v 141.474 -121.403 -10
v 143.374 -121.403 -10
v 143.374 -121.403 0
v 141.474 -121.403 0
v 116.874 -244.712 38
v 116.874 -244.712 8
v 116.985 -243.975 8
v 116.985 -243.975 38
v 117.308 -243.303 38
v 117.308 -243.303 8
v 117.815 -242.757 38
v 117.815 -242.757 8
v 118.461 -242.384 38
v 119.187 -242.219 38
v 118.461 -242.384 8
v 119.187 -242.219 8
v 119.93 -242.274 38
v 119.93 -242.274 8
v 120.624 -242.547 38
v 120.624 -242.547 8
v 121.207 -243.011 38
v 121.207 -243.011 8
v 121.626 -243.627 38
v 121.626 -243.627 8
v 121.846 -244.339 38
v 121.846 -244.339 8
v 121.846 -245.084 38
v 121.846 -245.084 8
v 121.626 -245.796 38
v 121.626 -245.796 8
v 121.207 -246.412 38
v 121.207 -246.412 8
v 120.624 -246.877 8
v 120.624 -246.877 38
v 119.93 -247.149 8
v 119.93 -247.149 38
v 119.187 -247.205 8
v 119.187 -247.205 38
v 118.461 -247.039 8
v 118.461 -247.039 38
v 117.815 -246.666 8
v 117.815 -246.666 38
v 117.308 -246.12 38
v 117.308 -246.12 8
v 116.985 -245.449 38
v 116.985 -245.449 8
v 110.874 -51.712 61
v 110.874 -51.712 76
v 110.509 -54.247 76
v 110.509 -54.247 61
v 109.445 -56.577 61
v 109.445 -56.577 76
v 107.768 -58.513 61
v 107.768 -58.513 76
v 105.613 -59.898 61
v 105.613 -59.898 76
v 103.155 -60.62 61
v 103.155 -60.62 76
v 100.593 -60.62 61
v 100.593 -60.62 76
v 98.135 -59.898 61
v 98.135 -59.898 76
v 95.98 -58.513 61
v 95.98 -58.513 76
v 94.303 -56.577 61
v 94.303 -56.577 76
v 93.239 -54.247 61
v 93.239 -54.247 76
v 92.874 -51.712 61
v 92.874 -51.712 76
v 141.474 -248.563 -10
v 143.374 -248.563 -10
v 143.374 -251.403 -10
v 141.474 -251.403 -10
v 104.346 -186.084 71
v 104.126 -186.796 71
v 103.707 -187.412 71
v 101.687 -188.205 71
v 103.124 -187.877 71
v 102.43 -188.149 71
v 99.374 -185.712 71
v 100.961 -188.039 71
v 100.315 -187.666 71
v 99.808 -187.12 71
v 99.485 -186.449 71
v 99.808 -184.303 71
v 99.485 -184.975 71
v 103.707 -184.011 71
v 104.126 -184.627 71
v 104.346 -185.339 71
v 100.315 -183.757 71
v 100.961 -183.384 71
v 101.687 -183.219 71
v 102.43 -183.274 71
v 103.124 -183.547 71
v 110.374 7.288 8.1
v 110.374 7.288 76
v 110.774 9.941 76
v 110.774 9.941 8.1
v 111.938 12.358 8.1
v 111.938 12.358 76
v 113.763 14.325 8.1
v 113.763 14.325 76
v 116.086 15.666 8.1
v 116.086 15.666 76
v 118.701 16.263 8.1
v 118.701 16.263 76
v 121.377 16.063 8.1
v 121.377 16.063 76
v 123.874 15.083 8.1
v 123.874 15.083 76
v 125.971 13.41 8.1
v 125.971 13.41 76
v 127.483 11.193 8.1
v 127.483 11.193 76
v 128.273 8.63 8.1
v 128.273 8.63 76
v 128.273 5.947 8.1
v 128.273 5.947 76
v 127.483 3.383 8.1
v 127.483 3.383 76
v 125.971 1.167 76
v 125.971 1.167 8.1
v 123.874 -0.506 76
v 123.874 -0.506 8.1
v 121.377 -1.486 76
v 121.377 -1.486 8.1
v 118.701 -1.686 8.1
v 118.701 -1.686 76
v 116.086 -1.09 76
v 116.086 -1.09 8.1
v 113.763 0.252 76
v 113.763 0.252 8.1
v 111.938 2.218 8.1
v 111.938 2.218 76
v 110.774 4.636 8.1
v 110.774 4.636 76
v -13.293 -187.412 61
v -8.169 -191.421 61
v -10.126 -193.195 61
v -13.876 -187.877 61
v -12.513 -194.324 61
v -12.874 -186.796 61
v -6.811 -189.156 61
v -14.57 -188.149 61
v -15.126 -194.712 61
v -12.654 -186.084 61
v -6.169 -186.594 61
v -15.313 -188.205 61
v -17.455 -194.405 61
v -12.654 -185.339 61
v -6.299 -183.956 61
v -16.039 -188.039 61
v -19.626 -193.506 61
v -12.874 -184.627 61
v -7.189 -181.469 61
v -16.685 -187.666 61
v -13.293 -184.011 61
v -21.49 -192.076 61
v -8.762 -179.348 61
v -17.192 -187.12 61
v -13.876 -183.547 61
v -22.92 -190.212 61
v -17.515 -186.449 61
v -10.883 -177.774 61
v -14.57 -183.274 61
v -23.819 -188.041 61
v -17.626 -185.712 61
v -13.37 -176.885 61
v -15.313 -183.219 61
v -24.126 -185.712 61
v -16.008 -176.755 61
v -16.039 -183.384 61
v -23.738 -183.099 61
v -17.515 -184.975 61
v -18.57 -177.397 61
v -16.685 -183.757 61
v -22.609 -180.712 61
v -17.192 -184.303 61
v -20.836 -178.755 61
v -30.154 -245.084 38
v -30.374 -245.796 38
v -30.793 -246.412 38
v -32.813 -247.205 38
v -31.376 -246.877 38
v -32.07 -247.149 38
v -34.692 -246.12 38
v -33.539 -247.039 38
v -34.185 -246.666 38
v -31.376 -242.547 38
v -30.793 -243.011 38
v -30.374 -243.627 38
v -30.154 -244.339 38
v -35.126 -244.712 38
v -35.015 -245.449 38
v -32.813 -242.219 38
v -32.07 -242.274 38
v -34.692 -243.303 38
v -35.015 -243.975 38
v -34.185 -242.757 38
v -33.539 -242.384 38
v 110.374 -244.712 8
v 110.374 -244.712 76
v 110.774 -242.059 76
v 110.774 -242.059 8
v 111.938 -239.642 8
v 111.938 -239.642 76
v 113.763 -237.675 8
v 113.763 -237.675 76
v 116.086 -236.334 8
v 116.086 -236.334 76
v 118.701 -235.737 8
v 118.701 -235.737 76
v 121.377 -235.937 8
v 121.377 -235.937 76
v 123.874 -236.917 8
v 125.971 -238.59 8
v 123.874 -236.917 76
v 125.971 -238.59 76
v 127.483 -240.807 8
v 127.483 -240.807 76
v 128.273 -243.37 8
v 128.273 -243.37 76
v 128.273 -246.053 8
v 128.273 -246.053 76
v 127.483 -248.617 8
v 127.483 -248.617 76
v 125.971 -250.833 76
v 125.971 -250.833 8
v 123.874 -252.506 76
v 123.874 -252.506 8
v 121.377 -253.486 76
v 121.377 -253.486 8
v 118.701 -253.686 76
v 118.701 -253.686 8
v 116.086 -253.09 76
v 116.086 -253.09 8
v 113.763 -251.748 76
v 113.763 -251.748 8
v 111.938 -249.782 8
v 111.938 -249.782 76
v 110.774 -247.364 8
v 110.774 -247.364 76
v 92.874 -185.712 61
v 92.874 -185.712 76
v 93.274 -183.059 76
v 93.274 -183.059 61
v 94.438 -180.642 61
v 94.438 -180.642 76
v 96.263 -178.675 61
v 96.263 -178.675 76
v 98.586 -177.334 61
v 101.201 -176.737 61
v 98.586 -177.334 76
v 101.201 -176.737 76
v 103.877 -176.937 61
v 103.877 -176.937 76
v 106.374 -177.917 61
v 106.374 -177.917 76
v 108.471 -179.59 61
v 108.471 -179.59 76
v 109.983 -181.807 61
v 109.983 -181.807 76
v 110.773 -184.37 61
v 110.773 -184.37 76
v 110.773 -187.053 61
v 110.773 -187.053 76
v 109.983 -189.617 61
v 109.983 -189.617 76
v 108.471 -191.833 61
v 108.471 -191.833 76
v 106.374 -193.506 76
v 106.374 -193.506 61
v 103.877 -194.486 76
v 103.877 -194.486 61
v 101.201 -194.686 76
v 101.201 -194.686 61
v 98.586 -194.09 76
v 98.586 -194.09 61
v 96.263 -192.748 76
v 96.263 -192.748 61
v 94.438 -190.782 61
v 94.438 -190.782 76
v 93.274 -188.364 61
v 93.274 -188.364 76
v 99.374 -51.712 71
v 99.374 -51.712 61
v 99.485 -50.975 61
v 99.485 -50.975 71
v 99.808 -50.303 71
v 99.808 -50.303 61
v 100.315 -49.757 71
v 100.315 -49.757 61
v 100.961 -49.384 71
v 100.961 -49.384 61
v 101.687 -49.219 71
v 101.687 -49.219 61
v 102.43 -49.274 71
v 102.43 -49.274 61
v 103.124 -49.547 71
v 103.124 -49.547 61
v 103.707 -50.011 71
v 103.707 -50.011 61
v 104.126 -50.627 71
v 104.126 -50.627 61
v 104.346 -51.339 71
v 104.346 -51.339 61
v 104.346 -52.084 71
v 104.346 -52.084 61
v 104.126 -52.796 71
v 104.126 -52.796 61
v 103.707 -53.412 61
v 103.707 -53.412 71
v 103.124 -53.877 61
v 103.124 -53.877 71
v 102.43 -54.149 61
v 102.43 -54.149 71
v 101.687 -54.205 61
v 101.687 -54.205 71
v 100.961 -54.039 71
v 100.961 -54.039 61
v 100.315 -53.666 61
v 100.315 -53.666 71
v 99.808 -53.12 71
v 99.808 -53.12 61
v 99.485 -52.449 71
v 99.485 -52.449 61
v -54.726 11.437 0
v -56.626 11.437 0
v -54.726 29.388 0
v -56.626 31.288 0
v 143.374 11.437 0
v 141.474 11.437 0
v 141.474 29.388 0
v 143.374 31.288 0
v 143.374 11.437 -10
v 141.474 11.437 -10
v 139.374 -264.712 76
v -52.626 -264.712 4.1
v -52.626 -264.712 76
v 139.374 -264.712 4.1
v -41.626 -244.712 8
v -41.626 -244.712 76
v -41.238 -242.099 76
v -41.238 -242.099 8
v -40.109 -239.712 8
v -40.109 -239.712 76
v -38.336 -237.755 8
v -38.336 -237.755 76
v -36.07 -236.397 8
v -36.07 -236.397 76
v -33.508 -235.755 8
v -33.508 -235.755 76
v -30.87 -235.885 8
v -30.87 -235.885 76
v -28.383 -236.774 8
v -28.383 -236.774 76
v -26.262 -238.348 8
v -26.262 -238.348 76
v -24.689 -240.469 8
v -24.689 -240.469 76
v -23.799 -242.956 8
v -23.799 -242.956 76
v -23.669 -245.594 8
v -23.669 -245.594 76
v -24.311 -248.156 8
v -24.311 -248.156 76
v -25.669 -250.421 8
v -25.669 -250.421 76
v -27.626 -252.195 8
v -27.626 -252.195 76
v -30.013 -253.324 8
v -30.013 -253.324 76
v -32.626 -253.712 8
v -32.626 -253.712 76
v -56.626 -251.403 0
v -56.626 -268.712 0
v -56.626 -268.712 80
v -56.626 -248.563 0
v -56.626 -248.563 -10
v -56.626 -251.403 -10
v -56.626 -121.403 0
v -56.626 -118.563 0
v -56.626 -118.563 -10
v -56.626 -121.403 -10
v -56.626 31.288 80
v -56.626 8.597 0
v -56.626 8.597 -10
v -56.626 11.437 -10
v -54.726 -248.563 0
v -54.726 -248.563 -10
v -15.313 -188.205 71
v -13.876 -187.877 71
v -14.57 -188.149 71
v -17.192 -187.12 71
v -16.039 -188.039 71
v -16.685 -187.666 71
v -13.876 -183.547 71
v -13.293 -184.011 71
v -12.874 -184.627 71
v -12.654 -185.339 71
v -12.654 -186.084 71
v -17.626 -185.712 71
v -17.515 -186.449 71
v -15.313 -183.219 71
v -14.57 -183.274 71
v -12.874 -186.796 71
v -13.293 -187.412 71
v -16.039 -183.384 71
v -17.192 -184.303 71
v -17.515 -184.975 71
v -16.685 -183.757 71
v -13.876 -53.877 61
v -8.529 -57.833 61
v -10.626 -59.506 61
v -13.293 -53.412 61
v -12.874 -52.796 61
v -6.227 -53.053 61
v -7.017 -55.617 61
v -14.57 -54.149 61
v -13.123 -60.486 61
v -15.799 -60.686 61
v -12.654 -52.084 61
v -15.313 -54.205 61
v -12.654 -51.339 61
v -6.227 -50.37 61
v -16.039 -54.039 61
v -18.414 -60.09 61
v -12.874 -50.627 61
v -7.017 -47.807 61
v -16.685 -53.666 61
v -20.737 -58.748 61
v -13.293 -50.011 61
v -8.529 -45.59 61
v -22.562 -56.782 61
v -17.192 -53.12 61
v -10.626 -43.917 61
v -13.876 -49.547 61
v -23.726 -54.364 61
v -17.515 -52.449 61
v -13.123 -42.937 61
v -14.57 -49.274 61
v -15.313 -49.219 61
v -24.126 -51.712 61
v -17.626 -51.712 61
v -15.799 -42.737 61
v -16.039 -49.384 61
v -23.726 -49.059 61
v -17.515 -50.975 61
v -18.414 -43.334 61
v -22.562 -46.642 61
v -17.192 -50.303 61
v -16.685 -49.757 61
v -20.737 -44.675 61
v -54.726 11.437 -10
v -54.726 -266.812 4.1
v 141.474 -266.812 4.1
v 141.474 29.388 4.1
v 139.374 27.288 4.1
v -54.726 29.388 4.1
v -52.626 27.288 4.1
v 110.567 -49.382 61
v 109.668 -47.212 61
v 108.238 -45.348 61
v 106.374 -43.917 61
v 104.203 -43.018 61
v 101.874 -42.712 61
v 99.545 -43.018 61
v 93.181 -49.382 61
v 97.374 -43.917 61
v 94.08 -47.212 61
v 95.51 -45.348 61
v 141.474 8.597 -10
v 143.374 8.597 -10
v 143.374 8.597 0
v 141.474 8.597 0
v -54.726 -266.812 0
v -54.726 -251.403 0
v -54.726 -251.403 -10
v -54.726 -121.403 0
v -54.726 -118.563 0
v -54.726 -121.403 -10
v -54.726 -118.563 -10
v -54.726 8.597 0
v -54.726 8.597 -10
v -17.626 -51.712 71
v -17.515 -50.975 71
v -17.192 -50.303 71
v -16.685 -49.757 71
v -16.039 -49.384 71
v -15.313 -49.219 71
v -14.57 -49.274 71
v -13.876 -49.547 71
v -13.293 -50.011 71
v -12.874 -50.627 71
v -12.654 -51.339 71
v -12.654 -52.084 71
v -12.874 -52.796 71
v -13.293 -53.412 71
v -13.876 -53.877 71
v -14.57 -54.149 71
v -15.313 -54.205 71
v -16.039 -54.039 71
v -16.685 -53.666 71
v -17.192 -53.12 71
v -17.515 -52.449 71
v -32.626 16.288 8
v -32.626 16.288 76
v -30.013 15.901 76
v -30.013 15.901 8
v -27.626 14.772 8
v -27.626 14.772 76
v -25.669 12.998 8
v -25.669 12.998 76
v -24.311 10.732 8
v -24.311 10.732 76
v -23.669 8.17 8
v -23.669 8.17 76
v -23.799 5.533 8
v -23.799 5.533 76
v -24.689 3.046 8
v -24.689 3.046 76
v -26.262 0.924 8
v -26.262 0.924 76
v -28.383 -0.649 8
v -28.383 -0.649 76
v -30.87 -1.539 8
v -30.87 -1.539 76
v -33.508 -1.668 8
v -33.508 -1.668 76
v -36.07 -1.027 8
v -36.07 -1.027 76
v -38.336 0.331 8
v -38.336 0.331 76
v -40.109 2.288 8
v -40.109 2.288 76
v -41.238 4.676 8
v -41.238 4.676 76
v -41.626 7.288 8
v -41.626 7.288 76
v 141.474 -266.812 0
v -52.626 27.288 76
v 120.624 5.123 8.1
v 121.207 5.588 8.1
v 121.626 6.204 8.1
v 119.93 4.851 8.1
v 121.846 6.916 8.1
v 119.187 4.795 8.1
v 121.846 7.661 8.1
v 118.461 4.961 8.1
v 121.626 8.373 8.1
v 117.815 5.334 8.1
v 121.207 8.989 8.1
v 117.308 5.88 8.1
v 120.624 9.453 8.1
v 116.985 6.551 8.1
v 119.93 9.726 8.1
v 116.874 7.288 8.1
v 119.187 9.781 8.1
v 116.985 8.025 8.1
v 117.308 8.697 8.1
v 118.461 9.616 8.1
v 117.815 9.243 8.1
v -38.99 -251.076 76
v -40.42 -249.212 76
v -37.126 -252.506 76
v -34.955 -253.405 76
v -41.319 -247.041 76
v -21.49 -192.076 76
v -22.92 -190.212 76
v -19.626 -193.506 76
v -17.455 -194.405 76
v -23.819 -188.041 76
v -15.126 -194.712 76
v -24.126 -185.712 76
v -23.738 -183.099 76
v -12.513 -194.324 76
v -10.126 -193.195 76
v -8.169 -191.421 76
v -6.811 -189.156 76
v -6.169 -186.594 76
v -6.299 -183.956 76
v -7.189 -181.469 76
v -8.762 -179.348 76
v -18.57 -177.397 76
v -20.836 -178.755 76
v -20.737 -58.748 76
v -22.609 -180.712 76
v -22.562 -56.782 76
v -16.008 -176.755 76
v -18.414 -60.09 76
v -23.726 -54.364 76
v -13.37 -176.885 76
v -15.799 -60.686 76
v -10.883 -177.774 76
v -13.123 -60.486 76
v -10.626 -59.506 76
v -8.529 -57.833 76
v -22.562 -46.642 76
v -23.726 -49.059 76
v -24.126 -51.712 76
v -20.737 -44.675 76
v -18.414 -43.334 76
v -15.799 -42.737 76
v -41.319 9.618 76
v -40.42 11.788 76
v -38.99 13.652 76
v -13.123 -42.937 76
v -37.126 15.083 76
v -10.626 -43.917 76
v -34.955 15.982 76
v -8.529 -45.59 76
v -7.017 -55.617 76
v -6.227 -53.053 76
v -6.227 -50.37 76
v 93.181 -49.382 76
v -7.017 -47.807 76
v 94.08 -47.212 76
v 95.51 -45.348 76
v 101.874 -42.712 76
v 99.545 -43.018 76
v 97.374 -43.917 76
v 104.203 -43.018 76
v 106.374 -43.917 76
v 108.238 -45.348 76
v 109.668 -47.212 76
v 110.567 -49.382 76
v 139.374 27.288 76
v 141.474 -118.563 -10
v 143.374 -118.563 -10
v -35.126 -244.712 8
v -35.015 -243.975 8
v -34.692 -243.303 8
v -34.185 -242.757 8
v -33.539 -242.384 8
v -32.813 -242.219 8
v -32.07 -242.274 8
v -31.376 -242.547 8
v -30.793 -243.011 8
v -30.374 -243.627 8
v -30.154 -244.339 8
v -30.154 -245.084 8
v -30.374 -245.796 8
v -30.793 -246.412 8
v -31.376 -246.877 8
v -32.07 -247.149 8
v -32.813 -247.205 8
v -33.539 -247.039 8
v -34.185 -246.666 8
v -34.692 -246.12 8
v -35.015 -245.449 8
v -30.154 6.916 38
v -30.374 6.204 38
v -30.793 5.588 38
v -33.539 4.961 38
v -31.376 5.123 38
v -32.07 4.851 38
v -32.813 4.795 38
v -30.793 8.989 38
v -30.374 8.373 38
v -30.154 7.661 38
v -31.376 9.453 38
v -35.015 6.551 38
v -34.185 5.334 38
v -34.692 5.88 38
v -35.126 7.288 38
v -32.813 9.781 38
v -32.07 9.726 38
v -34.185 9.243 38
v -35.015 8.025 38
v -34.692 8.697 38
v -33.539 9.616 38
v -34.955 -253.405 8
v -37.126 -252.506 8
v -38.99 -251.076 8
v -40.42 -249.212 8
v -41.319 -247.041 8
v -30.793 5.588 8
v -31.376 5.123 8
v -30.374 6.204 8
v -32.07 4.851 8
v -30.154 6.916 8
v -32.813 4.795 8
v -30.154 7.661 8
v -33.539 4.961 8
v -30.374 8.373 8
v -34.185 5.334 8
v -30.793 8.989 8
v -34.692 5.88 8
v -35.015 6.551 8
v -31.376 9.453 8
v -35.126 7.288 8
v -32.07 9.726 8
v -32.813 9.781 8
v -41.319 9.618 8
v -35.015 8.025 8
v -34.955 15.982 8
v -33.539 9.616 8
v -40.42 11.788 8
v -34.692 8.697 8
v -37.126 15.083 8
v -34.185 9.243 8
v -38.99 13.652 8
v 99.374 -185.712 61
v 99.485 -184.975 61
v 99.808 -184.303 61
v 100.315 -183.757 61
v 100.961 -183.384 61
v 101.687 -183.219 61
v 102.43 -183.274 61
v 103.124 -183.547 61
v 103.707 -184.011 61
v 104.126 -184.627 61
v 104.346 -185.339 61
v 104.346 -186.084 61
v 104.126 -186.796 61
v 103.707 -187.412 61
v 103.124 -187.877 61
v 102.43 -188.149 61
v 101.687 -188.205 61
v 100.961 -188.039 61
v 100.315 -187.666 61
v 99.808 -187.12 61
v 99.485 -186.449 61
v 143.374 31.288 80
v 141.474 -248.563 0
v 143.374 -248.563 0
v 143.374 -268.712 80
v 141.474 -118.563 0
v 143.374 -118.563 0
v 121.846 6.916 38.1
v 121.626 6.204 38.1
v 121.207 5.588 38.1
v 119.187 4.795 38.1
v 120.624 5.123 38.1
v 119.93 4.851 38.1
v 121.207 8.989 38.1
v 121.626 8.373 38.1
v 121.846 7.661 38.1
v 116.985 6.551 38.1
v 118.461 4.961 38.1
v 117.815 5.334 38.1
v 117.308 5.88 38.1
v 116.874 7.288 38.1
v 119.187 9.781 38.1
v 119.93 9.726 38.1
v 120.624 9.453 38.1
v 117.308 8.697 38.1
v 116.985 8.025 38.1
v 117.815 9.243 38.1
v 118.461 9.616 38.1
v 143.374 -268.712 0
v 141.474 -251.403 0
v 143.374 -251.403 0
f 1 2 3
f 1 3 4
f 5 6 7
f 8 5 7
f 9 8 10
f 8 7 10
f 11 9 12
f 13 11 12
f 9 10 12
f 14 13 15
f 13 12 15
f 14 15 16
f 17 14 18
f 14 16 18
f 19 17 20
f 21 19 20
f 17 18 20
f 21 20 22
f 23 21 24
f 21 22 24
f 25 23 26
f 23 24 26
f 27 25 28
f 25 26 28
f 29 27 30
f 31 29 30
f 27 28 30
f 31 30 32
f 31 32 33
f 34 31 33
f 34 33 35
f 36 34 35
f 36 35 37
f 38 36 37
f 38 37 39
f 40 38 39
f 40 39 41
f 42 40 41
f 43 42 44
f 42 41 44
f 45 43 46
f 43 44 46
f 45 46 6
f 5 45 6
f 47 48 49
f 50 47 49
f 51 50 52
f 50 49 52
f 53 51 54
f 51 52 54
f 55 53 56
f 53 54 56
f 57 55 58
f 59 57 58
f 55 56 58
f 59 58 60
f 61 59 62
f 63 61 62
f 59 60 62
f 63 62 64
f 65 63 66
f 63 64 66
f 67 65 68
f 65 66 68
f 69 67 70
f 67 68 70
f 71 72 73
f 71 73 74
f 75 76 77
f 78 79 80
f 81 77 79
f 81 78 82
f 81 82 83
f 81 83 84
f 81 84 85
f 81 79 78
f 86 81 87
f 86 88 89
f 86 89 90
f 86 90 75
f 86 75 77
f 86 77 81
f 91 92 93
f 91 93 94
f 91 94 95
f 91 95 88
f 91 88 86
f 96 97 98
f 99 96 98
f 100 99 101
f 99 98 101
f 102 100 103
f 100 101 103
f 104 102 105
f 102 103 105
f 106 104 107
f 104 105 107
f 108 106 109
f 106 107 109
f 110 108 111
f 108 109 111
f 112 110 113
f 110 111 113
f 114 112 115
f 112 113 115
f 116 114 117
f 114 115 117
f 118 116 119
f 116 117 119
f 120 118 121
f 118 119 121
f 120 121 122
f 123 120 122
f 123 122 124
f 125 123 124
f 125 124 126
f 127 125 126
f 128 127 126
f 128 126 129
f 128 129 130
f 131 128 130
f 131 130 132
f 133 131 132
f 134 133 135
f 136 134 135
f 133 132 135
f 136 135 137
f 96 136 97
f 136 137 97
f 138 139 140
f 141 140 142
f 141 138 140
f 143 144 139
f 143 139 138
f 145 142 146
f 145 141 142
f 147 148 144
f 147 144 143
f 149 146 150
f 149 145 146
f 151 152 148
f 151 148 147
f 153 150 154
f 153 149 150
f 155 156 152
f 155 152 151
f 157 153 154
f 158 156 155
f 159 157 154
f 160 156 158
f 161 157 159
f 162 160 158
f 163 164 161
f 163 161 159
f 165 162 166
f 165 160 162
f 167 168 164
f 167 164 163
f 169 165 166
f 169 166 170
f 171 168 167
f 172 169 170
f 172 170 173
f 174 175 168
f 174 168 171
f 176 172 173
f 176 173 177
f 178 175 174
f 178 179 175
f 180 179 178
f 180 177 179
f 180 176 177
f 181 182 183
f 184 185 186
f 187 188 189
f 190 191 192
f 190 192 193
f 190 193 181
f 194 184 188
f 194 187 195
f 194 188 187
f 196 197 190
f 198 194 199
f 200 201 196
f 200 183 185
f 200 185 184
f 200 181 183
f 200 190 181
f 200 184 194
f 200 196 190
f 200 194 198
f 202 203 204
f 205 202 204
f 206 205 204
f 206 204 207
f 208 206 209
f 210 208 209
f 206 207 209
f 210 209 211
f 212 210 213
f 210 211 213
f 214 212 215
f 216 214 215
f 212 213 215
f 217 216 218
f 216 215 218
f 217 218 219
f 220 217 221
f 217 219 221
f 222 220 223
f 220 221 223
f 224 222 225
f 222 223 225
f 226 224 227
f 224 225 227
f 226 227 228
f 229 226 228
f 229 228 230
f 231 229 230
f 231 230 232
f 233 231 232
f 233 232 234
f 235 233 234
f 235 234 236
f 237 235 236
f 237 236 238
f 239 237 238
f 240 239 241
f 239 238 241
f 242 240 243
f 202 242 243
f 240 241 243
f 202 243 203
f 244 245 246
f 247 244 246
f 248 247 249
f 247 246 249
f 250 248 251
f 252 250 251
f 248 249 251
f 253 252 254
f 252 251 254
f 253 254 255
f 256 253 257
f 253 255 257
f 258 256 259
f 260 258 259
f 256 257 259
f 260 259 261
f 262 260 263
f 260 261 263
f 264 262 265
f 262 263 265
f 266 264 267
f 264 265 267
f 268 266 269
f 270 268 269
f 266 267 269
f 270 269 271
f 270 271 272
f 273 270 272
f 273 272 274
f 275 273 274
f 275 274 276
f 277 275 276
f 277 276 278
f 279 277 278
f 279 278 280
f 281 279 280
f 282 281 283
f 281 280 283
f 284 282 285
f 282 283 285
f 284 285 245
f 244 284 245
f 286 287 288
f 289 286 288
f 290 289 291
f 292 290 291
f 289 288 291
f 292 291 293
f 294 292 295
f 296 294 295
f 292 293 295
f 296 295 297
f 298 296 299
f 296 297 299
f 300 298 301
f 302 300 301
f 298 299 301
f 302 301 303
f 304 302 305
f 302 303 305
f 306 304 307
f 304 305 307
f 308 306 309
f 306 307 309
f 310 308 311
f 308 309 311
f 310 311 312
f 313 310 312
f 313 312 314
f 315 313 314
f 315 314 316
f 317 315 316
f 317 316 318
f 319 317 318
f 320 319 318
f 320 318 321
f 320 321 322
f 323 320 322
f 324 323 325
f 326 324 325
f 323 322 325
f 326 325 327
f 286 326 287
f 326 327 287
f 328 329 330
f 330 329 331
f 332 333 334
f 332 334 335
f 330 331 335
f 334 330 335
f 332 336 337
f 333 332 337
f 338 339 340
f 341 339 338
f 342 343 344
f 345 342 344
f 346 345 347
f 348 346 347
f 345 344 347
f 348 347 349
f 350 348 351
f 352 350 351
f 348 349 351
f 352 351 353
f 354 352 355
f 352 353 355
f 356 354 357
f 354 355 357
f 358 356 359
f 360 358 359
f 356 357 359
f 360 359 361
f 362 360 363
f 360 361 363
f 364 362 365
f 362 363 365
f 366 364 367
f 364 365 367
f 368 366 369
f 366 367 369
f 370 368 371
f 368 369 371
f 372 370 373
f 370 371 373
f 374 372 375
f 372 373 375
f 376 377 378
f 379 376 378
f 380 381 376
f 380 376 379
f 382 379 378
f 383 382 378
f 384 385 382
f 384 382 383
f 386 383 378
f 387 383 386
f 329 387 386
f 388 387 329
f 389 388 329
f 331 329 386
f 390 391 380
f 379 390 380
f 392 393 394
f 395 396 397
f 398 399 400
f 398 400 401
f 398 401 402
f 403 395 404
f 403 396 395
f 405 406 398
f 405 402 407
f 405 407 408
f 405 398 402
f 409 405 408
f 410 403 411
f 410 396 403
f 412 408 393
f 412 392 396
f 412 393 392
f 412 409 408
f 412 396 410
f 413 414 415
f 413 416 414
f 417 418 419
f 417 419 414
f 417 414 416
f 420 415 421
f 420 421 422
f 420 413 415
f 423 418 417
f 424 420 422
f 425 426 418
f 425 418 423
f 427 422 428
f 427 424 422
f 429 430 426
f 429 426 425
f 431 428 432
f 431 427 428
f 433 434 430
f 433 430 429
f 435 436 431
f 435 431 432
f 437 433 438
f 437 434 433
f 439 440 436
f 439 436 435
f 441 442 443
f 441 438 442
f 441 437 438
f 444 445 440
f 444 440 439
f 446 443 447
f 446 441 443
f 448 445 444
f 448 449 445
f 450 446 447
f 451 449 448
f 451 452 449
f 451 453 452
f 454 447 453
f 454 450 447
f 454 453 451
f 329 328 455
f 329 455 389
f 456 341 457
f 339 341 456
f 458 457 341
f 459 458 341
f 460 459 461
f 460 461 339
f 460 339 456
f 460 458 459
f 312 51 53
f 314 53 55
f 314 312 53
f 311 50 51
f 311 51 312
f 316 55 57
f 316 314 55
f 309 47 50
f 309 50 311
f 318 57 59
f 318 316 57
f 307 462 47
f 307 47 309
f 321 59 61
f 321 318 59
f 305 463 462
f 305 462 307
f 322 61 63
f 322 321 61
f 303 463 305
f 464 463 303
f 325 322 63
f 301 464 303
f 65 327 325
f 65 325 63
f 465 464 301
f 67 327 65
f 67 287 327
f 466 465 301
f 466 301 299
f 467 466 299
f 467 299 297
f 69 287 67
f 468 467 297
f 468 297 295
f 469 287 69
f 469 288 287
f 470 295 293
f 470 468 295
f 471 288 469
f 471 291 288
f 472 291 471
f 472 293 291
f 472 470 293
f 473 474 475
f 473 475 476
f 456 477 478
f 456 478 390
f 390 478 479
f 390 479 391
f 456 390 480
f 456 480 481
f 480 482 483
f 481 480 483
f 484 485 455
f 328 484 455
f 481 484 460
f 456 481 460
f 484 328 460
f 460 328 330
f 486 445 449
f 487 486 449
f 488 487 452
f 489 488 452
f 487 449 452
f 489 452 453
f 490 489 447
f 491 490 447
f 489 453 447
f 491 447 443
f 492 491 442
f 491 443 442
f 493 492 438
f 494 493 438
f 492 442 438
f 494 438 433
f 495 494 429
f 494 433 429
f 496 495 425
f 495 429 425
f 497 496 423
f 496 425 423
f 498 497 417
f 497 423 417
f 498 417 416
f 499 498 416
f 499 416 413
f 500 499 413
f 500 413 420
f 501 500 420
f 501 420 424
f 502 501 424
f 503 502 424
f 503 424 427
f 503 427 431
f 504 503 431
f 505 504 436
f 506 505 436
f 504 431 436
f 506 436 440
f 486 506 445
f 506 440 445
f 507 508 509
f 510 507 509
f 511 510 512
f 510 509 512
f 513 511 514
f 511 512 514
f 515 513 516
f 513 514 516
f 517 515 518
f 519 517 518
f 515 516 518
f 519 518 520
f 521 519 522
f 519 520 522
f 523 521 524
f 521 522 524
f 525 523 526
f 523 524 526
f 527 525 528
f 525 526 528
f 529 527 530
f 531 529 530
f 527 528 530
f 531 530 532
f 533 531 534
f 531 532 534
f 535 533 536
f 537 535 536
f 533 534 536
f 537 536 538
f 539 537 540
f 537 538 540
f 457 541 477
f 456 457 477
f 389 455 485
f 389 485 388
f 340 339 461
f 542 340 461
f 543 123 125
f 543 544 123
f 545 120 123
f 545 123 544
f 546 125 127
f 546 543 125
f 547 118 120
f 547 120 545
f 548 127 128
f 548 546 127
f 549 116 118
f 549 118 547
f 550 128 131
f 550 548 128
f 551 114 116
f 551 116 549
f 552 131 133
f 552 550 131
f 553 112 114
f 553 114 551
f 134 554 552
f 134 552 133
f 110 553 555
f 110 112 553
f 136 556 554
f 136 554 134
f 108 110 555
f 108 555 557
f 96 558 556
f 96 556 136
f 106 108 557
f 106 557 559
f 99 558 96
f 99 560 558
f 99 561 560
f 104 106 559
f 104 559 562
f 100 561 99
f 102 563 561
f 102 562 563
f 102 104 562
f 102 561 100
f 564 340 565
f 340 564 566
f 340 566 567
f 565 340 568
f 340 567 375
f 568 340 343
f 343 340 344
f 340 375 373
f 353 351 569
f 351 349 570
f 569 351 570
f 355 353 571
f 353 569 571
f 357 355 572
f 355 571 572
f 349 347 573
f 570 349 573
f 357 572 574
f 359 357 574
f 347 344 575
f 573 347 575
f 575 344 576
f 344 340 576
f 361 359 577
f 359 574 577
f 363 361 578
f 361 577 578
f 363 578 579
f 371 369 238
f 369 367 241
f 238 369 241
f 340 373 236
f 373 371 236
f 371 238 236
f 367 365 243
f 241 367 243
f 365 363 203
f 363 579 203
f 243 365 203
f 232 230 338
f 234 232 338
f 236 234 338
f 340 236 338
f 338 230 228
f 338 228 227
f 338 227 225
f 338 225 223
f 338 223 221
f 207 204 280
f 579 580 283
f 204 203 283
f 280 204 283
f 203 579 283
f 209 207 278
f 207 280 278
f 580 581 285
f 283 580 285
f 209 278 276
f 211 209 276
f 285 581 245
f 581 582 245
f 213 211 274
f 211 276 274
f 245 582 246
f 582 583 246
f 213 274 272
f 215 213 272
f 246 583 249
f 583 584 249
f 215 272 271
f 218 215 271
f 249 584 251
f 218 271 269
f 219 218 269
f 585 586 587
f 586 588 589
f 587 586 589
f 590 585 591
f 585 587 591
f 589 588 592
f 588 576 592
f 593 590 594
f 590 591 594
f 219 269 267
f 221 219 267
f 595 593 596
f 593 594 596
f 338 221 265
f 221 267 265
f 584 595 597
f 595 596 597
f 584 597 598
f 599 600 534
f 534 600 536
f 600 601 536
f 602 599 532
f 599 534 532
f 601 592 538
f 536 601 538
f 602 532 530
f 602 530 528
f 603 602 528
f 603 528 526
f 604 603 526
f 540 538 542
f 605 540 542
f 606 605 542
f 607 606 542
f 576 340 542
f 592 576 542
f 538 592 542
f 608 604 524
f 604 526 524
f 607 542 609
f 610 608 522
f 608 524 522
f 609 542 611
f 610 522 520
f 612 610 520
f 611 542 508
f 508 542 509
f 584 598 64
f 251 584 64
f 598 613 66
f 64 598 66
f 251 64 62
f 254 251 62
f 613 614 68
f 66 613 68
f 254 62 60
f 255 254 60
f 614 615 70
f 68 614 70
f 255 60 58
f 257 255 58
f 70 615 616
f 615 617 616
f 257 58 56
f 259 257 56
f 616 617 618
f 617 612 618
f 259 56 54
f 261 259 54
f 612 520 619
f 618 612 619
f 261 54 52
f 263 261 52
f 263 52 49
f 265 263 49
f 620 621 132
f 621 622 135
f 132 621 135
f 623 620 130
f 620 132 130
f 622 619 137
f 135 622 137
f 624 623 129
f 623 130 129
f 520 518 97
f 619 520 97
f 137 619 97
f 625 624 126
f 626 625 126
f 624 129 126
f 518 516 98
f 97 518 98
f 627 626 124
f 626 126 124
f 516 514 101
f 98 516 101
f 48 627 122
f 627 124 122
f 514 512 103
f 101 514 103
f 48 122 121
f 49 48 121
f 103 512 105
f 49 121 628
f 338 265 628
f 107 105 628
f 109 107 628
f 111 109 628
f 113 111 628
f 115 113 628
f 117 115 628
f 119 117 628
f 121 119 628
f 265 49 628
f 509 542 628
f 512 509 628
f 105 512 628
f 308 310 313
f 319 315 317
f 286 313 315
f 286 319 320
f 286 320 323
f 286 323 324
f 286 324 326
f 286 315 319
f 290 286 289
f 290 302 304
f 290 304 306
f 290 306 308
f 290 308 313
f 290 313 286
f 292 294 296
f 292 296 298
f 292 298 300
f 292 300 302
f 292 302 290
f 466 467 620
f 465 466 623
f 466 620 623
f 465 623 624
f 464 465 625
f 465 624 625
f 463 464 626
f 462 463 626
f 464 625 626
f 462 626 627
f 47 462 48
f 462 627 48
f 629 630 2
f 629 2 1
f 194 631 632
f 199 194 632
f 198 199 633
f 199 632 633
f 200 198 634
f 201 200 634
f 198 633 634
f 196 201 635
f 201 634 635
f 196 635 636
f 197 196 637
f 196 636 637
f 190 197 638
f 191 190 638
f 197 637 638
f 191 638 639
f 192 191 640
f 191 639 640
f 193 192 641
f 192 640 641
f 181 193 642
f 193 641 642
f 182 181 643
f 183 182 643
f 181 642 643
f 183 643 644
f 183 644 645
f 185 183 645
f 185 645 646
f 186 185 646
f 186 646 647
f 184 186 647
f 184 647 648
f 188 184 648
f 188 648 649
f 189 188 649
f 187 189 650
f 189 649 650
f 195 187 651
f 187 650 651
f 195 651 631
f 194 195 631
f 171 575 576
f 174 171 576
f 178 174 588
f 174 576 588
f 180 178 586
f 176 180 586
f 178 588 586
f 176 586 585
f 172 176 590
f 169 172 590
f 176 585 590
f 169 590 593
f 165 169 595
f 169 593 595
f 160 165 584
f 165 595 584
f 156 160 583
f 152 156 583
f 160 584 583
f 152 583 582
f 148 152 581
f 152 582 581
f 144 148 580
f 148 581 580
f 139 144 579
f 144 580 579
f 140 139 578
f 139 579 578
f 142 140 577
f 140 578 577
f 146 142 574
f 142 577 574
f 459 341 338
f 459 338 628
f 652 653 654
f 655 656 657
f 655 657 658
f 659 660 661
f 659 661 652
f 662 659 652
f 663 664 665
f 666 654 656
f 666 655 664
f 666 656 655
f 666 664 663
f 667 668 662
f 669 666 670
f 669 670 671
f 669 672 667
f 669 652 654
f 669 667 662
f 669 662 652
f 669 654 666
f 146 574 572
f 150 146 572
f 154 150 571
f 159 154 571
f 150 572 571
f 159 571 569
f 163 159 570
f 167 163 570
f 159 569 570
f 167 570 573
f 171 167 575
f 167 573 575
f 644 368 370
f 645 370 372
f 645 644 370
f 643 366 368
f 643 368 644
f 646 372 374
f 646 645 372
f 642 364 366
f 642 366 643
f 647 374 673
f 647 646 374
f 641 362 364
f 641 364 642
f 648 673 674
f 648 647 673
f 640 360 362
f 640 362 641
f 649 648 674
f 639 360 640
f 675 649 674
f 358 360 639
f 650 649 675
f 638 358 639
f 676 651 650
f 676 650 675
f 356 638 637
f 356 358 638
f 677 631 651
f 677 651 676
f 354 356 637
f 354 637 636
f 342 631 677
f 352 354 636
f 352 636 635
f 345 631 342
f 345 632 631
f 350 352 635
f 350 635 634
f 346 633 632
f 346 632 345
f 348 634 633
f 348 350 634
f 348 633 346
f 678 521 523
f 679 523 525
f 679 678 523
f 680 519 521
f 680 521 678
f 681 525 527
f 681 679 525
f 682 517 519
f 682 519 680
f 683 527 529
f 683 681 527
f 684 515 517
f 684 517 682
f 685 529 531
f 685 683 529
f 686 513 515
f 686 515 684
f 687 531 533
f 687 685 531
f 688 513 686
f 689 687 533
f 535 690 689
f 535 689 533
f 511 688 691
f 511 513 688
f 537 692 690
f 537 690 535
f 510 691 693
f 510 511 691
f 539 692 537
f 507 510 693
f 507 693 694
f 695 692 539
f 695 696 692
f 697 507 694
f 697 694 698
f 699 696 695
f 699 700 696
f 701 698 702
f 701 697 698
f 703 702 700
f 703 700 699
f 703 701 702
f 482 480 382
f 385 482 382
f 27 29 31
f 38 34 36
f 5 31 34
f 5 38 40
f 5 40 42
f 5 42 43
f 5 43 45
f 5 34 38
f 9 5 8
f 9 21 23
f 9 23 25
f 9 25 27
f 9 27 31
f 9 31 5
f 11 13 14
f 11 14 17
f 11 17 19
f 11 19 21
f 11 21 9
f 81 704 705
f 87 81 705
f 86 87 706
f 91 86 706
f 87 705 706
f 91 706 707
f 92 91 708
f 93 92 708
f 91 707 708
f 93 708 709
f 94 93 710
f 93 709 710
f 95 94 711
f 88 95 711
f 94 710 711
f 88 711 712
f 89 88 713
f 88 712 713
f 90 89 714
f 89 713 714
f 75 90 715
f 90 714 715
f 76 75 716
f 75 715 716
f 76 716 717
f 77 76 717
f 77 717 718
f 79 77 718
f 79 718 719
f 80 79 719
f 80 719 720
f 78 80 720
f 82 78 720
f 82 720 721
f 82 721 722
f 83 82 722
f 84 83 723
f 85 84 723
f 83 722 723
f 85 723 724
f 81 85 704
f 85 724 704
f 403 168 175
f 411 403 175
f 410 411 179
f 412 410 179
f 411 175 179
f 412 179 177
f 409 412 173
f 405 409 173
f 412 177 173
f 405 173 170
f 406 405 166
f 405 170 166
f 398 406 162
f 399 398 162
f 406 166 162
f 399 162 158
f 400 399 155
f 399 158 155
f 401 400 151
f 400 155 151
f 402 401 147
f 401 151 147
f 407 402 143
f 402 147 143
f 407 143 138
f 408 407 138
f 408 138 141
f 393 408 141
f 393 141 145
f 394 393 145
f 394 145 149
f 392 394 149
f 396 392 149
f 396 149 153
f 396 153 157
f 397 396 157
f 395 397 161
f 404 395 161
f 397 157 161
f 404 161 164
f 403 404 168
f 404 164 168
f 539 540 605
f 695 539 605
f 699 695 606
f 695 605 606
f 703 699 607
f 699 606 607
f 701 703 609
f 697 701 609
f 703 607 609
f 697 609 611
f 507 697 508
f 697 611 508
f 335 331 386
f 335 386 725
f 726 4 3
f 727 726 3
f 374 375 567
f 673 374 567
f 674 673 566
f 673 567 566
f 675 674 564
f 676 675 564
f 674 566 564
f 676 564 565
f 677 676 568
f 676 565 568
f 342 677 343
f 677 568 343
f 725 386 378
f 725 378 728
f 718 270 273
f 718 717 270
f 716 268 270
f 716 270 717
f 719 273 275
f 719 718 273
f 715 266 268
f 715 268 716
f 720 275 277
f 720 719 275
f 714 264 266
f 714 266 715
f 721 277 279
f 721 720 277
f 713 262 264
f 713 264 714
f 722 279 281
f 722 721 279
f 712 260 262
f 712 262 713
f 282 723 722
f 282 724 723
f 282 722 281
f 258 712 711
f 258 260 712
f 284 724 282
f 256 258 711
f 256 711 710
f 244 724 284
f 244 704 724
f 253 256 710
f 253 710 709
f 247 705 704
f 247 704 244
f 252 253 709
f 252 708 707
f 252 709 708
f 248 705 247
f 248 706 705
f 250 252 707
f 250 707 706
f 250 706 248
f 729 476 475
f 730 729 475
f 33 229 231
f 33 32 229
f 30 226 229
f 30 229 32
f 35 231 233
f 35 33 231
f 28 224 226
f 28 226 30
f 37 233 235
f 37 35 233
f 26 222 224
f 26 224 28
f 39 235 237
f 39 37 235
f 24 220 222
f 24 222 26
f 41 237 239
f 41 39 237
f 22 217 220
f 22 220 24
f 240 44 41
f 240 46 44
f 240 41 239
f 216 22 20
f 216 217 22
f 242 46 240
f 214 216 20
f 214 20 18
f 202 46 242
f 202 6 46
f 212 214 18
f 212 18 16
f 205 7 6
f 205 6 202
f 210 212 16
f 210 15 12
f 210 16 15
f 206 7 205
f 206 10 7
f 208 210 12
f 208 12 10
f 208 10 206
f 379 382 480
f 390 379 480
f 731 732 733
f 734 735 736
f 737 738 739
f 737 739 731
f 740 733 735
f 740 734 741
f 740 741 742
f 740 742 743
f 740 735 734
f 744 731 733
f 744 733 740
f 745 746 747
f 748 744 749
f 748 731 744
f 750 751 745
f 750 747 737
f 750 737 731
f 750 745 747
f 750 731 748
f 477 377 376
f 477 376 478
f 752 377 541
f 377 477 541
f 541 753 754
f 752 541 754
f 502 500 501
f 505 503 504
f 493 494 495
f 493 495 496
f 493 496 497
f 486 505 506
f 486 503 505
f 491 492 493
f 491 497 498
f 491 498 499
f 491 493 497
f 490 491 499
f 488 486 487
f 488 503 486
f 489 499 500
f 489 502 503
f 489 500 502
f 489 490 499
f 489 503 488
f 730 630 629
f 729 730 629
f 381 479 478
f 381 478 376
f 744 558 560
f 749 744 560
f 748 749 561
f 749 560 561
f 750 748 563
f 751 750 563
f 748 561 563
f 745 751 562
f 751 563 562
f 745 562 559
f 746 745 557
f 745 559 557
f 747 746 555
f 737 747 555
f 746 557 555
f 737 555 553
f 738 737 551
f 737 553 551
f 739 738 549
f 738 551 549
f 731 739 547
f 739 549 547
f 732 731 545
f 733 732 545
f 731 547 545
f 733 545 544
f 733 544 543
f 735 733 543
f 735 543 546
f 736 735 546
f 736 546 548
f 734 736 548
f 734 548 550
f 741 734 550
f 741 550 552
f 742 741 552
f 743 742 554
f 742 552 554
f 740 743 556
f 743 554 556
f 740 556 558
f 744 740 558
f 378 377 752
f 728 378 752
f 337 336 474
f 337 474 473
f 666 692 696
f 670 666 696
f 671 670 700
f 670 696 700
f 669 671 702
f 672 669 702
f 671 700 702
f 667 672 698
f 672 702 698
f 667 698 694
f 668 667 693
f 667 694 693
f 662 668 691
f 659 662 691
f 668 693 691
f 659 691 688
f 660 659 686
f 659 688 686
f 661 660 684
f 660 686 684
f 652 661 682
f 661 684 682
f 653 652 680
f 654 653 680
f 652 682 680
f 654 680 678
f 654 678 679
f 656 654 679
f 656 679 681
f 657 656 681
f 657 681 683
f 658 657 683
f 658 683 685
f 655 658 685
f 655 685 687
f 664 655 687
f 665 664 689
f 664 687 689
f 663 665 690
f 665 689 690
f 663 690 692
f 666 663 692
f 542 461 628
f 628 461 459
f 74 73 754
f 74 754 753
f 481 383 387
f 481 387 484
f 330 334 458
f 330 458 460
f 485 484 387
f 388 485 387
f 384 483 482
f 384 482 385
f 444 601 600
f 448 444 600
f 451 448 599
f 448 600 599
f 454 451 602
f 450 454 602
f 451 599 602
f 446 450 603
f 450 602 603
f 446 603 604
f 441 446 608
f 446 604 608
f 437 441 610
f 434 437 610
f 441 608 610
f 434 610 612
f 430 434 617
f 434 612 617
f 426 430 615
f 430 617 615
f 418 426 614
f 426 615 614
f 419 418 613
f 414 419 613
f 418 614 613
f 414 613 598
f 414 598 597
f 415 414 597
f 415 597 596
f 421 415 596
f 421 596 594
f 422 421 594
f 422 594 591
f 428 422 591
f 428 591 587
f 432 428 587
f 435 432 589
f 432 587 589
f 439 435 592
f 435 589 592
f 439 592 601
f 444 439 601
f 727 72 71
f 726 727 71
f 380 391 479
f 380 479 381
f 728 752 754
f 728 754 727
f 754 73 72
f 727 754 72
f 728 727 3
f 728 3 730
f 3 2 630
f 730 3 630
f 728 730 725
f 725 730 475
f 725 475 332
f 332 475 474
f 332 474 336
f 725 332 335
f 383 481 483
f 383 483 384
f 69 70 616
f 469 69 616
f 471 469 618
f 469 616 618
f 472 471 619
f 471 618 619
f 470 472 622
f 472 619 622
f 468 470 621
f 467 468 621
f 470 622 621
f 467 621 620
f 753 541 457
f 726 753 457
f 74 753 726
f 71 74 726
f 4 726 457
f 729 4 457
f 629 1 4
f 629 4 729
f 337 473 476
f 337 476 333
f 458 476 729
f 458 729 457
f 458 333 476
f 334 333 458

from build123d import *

# Parameters (mm, degrees)
ESQUISSE1_W                          = 200
ESQUISSE1_H                          = 300
BOSS_EXTRU_1_DEPTH                   = 80
COQUE1_T                             = -4
ESQUISSE3_W                          = 196.2
ESQUISSE3_H                          = 296.2
ENL_V_MAT_EXTRU_2_DEPTH              = 4.1
ESQUISSE4_R                          = 9
BOSS_EXTRU_2_DEPTH                   = 67.9
ESQUISSE5_R                          = 2.5
ENL_V_MAT_EXTRU_3_DEPTH              = 30
ESQUISSE4_4_R                        = 9
BOSS_EXTRU_3_DEPTH                   = 15
ESQUISSE6_R                          = 2.5
ENL_V_MAT_EXTRU_6_DEPTH              = 10
ESQUISSE8_R                          = 9
BOSS_EXTRU_5_DEPTH                   = 68
ESQUISSE9_R                          = 2.5
ENL_V_MAT_EXTRU_8_DEPTH              = 30
ESQUISSE10_W                         = 1.9
ESQUISSE10_H                         = 2.840533171
BOSS_EXTRU_6_DEPTH                   = 10
R_P_TITION_LIN_AIRE1_COUNT           = 2
R_P_TITION_LIN_AIRE1_PITCH           = 198.1
R_P_TITION_LIN_AIRE2_COPY_1_SKETCH_W = 1.9
R_P_TITION_LIN_AIRE2_COPY_1_SKETCH_H = 2.840533171
R_P_TITION_LIN_AIRE2_COPY_1_DEPTH    = 10
R_P_TITION_LIN_AIRE2_COPY_2_SKETCH_W = 1.9
R_P_TITION_LIN_AIRE2_COPY_2_SKETCH_H = 2.840533171
R_P_TITION_LIN_AIRE2_COPY_2_DEPTH    = 10
R_P_TITION_LIN_AIRE2_COPY_3_SKETCH_W = 1.9
R_P_TITION_LIN_AIRE2_COPY_3_SKETCH_H = 2.840533171
R_P_TITION_LIN_AIRE2_COPY_3_DEPTH    = 10
R_P_TITION_LIN_AIRE2_COPY_4_SKETCH_W = 1.9
R_P_TITION_LIN_AIRE2_COPY_4_SKETCH_H = 2.840533171
R_P_TITION_LIN_AIRE2_COPY_4_DEPTH    = 10


with BuildPart() as part:
    # Esquisse1 → Boss.-Extru.1 (new body)
    with BuildSketch(Plane.XY):
        with Locations((43.373964051, -118.711656442)):
            Rectangle(ESQUISSE1_W, ESQUISSE1_H)
    extrude(amount=BOSS_EXTRU_1_DEPTH)

    # Coque1
    coque1_openings = [part.faces().sort_by_distance(p)[0] for p in [
        (43.373964051, -118.711656442, 0),
    ]]
    offset(amount=COQUE1_T, openings=coque1_openings, kind=Kind.INTERSECTION)

    # Esquisse3 → Enlèv. mat.-Extru.2 (cut)
    with BuildSketch(Plane(origin=(0, 0, 0), x_dir=(-1, 0, 0), z_dir=(0, 0, -1))):
        with Locations((-43.373964051, -118.711656442)):
            Rectangle(ESQUISSE3_W, ESQUISSE3_H)
    extrude(amount=-ENL_V_MAT_EXTRU_2_DEPTH, mode=Mode.SUBTRACT)

    # Esquisse4 → Boss.-Extru.2 (add)
    with BuildSketch(Plane(origin=(0, 0, 76), x_dir=(-1, 0, 0), z_dir=(0, 0, -1))):
        with Locations((-119.373964051, 7.288343558)):
            Circle(ESQUISSE4_R)
    extrude(amount=BOSS_EXTRU_2_DEPTH)

    # Esquisse5 → Enlèv. mat.-Extru.3 (cut)
    with BuildSketch(Plane(origin=(0, 0, 8.1), x_dir=(-1, 0, 0), z_dir=(0, 0, -1))):
        with Locations((-119.373964051, 7.288343558)):
            Circle(ESQUISSE5_R)
    extrude(amount=-ENL_V_MAT_EXTRU_3_DEPTH, mode=Mode.SUBTRACT)

    # Esquisse4<4> → Boss.-Extru.3 (add)
    with BuildSketch(Plane(origin=(0, 0, 76), x_dir=(-1, 0, 0), z_dir=(0, 0, -1))):
        with Locations((15.126035949, -185.711656442)):
            Circle(ESQUISSE4_4_R)
        with Locations((-101.873964051, -185.711656442)):
            Circle(ESQUISSE4_4_R)
        with Locations((-101.873964051, -51.711656442)):
            Circle(ESQUISSE4_4_R)
        with Locations((15.126035949, -51.711656442)):
            Circle(ESQUISSE4_4_R)
    extrude(amount=BOSS_EXTRU_3_DEPTH)

    # Esquisse6 → Enlèv. mat.-Extru.6 (cut)
    with BuildSketch(Plane(origin=(0, 0, 61), x_dir=(-1, 0, 0), z_dir=(0, 0, -1))):
        with Locations((-101.873964051, -51.711656442)):
            Circle(ESQUISSE6_R)
        with Locations((15.126035949, -51.711656442)):
            Circle(ESQUISSE6_R)
        with Locations((-101.873964051, -185.711656442)):
            Circle(ESQUISSE6_R)
        with Locations((15.126035949, -185.711656442)):
            Circle(ESQUISSE6_R)
    extrude(amount=-ENL_V_MAT_EXTRU_6_DEPTH, mode=Mode.SUBTRACT)

    # Esquisse8 → Boss.-Extru.5 (add)
    with BuildSketch(Plane(origin=(0, 0, 76), x_dir=(-1, 0, 0), z_dir=(0, 0, -1))):
        with Locations((32.626035949, 7.288343558)):
            Circle(ESQUISSE8_R)
        with Locations((32.626035949, -244.711656442)):
            Circle(ESQUISSE8_R)
        with Locations((-119.373964051, -244.711656442)):
            Circle(ESQUISSE8_R)
    extrude(amount=BOSS_EXTRU_5_DEPTH)

    # Esquisse9 → Enlèv. mat.-Extru.8 (cut)
    with BuildSketch(Plane(origin=(0, 0, 8), x_dir=(-1, 0, 0), z_dir=(0, 0, -1))):
        with Locations((32.626035949, 7.288343558)):
            Circle(ESQUISSE9_R)
        with Locations((32.626035949, -244.711656442)):
            Circle(ESQUISSE9_R)
        with Locations((-119.373964051, -244.711656442)):
            Circle(ESQUISSE9_R)
    extrude(amount=-ENL_V_MAT_EXTRU_8_DEPTH, mode=Mode.SUBTRACT)

    # Esquisse10 → Boss.-Extru.6 (add)
    with BuildSketch(Plane(origin=(0, 0, 0), x_dir=(-1, 0, 0), z_dir=(0, 0, -1))):
        with Locations((-142.423964051, -249.983146828)):
            Rectangle(ESQUISSE10_W, ESQUISSE10_H)
    boss_extru_6 = extrude(amount=BOSS_EXTRU_6_DEPTH)

    # Répétition linéaire1: Boss.-Extru.6 ×2
    with Locations(*[(-i * R_P_TITION_LIN_AIRE1_PITCH, 0, 0) for i in range(1, R_P_TITION_LIN_AIRE1_COUNT)]):
        add(boss_extru_6)

    # Répétition linéaire2 copy 1 sketch → Répétition linéaire2 copy 1 (add)
    with BuildSketch(Plane(origin=(-198.1, 130, 0), x_dir=(-1, 0, 0), z_dir=(0, 0, -1))):
        with Locations((-142.423964051, -249.983146828)):
            Rectangle(R_P_TITION_LIN_AIRE2_COPY_1_SKETCH_W, R_P_TITION_LIN_AIRE2_COPY_1_SKETCH_H)
    extrude(amount=R_P_TITION_LIN_AIRE2_COPY_1_DEPTH)

    # Répétition linéaire2 copy 2 sketch → Répétition linéaire2 copy 2 (add)
    with BuildSketch(Plane(origin=(-198.1, 260, 0), x_dir=(-1, 0, 0), z_dir=(0, 0, -1))):
        with Locations((-142.423964051, -249.983146828)):
            Rectangle(R_P_TITION_LIN_AIRE2_COPY_2_SKETCH_W, R_P_TITION_LIN_AIRE2_COPY_2_SKETCH_H)
    extrude(amount=R_P_TITION_LIN_AIRE2_COPY_2_DEPTH)

    # Répétition linéaire2 copy 3 sketch → Répétition linéaire2 copy 3 (add)
    with BuildSketch(Plane(origin=(0, 130, 0), x_dir=(-1, 0, 0), z_dir=(0, 0, -1))):
        with Locations((-142.423964051, -249.983146828)):
            Rectangle(R_P_TITION_LIN_AIRE2_COPY_3_SKETCH_W, R_P_TITION_LIN_AIRE2_COPY_3_SKETCH_H)
    extrude(amount=R_P_TITION_LIN_AIRE2_COPY_3_DEPTH)

    # Répétition linéaire2 copy 4 sketch → Répétition linéaire2 copy 4 (add)
    with BuildSketch(Plane(origin=(0, 260, 0), x_dir=(-1, 0, 0), z_dir=(0, 0, -1))):
        with Locations((-142.423964051, -249.983146828)):
            Rectangle(R_P_TITION_LIN_AIRE2_COPY_4_SKETCH_W, R_P_TITION_LIN_AIRE2_COPY_4_SKETCH_H)
    extrude(amount=R_P_TITION_LIN_AIRE2_COPY_4_DEPTH)


solid = part.part
